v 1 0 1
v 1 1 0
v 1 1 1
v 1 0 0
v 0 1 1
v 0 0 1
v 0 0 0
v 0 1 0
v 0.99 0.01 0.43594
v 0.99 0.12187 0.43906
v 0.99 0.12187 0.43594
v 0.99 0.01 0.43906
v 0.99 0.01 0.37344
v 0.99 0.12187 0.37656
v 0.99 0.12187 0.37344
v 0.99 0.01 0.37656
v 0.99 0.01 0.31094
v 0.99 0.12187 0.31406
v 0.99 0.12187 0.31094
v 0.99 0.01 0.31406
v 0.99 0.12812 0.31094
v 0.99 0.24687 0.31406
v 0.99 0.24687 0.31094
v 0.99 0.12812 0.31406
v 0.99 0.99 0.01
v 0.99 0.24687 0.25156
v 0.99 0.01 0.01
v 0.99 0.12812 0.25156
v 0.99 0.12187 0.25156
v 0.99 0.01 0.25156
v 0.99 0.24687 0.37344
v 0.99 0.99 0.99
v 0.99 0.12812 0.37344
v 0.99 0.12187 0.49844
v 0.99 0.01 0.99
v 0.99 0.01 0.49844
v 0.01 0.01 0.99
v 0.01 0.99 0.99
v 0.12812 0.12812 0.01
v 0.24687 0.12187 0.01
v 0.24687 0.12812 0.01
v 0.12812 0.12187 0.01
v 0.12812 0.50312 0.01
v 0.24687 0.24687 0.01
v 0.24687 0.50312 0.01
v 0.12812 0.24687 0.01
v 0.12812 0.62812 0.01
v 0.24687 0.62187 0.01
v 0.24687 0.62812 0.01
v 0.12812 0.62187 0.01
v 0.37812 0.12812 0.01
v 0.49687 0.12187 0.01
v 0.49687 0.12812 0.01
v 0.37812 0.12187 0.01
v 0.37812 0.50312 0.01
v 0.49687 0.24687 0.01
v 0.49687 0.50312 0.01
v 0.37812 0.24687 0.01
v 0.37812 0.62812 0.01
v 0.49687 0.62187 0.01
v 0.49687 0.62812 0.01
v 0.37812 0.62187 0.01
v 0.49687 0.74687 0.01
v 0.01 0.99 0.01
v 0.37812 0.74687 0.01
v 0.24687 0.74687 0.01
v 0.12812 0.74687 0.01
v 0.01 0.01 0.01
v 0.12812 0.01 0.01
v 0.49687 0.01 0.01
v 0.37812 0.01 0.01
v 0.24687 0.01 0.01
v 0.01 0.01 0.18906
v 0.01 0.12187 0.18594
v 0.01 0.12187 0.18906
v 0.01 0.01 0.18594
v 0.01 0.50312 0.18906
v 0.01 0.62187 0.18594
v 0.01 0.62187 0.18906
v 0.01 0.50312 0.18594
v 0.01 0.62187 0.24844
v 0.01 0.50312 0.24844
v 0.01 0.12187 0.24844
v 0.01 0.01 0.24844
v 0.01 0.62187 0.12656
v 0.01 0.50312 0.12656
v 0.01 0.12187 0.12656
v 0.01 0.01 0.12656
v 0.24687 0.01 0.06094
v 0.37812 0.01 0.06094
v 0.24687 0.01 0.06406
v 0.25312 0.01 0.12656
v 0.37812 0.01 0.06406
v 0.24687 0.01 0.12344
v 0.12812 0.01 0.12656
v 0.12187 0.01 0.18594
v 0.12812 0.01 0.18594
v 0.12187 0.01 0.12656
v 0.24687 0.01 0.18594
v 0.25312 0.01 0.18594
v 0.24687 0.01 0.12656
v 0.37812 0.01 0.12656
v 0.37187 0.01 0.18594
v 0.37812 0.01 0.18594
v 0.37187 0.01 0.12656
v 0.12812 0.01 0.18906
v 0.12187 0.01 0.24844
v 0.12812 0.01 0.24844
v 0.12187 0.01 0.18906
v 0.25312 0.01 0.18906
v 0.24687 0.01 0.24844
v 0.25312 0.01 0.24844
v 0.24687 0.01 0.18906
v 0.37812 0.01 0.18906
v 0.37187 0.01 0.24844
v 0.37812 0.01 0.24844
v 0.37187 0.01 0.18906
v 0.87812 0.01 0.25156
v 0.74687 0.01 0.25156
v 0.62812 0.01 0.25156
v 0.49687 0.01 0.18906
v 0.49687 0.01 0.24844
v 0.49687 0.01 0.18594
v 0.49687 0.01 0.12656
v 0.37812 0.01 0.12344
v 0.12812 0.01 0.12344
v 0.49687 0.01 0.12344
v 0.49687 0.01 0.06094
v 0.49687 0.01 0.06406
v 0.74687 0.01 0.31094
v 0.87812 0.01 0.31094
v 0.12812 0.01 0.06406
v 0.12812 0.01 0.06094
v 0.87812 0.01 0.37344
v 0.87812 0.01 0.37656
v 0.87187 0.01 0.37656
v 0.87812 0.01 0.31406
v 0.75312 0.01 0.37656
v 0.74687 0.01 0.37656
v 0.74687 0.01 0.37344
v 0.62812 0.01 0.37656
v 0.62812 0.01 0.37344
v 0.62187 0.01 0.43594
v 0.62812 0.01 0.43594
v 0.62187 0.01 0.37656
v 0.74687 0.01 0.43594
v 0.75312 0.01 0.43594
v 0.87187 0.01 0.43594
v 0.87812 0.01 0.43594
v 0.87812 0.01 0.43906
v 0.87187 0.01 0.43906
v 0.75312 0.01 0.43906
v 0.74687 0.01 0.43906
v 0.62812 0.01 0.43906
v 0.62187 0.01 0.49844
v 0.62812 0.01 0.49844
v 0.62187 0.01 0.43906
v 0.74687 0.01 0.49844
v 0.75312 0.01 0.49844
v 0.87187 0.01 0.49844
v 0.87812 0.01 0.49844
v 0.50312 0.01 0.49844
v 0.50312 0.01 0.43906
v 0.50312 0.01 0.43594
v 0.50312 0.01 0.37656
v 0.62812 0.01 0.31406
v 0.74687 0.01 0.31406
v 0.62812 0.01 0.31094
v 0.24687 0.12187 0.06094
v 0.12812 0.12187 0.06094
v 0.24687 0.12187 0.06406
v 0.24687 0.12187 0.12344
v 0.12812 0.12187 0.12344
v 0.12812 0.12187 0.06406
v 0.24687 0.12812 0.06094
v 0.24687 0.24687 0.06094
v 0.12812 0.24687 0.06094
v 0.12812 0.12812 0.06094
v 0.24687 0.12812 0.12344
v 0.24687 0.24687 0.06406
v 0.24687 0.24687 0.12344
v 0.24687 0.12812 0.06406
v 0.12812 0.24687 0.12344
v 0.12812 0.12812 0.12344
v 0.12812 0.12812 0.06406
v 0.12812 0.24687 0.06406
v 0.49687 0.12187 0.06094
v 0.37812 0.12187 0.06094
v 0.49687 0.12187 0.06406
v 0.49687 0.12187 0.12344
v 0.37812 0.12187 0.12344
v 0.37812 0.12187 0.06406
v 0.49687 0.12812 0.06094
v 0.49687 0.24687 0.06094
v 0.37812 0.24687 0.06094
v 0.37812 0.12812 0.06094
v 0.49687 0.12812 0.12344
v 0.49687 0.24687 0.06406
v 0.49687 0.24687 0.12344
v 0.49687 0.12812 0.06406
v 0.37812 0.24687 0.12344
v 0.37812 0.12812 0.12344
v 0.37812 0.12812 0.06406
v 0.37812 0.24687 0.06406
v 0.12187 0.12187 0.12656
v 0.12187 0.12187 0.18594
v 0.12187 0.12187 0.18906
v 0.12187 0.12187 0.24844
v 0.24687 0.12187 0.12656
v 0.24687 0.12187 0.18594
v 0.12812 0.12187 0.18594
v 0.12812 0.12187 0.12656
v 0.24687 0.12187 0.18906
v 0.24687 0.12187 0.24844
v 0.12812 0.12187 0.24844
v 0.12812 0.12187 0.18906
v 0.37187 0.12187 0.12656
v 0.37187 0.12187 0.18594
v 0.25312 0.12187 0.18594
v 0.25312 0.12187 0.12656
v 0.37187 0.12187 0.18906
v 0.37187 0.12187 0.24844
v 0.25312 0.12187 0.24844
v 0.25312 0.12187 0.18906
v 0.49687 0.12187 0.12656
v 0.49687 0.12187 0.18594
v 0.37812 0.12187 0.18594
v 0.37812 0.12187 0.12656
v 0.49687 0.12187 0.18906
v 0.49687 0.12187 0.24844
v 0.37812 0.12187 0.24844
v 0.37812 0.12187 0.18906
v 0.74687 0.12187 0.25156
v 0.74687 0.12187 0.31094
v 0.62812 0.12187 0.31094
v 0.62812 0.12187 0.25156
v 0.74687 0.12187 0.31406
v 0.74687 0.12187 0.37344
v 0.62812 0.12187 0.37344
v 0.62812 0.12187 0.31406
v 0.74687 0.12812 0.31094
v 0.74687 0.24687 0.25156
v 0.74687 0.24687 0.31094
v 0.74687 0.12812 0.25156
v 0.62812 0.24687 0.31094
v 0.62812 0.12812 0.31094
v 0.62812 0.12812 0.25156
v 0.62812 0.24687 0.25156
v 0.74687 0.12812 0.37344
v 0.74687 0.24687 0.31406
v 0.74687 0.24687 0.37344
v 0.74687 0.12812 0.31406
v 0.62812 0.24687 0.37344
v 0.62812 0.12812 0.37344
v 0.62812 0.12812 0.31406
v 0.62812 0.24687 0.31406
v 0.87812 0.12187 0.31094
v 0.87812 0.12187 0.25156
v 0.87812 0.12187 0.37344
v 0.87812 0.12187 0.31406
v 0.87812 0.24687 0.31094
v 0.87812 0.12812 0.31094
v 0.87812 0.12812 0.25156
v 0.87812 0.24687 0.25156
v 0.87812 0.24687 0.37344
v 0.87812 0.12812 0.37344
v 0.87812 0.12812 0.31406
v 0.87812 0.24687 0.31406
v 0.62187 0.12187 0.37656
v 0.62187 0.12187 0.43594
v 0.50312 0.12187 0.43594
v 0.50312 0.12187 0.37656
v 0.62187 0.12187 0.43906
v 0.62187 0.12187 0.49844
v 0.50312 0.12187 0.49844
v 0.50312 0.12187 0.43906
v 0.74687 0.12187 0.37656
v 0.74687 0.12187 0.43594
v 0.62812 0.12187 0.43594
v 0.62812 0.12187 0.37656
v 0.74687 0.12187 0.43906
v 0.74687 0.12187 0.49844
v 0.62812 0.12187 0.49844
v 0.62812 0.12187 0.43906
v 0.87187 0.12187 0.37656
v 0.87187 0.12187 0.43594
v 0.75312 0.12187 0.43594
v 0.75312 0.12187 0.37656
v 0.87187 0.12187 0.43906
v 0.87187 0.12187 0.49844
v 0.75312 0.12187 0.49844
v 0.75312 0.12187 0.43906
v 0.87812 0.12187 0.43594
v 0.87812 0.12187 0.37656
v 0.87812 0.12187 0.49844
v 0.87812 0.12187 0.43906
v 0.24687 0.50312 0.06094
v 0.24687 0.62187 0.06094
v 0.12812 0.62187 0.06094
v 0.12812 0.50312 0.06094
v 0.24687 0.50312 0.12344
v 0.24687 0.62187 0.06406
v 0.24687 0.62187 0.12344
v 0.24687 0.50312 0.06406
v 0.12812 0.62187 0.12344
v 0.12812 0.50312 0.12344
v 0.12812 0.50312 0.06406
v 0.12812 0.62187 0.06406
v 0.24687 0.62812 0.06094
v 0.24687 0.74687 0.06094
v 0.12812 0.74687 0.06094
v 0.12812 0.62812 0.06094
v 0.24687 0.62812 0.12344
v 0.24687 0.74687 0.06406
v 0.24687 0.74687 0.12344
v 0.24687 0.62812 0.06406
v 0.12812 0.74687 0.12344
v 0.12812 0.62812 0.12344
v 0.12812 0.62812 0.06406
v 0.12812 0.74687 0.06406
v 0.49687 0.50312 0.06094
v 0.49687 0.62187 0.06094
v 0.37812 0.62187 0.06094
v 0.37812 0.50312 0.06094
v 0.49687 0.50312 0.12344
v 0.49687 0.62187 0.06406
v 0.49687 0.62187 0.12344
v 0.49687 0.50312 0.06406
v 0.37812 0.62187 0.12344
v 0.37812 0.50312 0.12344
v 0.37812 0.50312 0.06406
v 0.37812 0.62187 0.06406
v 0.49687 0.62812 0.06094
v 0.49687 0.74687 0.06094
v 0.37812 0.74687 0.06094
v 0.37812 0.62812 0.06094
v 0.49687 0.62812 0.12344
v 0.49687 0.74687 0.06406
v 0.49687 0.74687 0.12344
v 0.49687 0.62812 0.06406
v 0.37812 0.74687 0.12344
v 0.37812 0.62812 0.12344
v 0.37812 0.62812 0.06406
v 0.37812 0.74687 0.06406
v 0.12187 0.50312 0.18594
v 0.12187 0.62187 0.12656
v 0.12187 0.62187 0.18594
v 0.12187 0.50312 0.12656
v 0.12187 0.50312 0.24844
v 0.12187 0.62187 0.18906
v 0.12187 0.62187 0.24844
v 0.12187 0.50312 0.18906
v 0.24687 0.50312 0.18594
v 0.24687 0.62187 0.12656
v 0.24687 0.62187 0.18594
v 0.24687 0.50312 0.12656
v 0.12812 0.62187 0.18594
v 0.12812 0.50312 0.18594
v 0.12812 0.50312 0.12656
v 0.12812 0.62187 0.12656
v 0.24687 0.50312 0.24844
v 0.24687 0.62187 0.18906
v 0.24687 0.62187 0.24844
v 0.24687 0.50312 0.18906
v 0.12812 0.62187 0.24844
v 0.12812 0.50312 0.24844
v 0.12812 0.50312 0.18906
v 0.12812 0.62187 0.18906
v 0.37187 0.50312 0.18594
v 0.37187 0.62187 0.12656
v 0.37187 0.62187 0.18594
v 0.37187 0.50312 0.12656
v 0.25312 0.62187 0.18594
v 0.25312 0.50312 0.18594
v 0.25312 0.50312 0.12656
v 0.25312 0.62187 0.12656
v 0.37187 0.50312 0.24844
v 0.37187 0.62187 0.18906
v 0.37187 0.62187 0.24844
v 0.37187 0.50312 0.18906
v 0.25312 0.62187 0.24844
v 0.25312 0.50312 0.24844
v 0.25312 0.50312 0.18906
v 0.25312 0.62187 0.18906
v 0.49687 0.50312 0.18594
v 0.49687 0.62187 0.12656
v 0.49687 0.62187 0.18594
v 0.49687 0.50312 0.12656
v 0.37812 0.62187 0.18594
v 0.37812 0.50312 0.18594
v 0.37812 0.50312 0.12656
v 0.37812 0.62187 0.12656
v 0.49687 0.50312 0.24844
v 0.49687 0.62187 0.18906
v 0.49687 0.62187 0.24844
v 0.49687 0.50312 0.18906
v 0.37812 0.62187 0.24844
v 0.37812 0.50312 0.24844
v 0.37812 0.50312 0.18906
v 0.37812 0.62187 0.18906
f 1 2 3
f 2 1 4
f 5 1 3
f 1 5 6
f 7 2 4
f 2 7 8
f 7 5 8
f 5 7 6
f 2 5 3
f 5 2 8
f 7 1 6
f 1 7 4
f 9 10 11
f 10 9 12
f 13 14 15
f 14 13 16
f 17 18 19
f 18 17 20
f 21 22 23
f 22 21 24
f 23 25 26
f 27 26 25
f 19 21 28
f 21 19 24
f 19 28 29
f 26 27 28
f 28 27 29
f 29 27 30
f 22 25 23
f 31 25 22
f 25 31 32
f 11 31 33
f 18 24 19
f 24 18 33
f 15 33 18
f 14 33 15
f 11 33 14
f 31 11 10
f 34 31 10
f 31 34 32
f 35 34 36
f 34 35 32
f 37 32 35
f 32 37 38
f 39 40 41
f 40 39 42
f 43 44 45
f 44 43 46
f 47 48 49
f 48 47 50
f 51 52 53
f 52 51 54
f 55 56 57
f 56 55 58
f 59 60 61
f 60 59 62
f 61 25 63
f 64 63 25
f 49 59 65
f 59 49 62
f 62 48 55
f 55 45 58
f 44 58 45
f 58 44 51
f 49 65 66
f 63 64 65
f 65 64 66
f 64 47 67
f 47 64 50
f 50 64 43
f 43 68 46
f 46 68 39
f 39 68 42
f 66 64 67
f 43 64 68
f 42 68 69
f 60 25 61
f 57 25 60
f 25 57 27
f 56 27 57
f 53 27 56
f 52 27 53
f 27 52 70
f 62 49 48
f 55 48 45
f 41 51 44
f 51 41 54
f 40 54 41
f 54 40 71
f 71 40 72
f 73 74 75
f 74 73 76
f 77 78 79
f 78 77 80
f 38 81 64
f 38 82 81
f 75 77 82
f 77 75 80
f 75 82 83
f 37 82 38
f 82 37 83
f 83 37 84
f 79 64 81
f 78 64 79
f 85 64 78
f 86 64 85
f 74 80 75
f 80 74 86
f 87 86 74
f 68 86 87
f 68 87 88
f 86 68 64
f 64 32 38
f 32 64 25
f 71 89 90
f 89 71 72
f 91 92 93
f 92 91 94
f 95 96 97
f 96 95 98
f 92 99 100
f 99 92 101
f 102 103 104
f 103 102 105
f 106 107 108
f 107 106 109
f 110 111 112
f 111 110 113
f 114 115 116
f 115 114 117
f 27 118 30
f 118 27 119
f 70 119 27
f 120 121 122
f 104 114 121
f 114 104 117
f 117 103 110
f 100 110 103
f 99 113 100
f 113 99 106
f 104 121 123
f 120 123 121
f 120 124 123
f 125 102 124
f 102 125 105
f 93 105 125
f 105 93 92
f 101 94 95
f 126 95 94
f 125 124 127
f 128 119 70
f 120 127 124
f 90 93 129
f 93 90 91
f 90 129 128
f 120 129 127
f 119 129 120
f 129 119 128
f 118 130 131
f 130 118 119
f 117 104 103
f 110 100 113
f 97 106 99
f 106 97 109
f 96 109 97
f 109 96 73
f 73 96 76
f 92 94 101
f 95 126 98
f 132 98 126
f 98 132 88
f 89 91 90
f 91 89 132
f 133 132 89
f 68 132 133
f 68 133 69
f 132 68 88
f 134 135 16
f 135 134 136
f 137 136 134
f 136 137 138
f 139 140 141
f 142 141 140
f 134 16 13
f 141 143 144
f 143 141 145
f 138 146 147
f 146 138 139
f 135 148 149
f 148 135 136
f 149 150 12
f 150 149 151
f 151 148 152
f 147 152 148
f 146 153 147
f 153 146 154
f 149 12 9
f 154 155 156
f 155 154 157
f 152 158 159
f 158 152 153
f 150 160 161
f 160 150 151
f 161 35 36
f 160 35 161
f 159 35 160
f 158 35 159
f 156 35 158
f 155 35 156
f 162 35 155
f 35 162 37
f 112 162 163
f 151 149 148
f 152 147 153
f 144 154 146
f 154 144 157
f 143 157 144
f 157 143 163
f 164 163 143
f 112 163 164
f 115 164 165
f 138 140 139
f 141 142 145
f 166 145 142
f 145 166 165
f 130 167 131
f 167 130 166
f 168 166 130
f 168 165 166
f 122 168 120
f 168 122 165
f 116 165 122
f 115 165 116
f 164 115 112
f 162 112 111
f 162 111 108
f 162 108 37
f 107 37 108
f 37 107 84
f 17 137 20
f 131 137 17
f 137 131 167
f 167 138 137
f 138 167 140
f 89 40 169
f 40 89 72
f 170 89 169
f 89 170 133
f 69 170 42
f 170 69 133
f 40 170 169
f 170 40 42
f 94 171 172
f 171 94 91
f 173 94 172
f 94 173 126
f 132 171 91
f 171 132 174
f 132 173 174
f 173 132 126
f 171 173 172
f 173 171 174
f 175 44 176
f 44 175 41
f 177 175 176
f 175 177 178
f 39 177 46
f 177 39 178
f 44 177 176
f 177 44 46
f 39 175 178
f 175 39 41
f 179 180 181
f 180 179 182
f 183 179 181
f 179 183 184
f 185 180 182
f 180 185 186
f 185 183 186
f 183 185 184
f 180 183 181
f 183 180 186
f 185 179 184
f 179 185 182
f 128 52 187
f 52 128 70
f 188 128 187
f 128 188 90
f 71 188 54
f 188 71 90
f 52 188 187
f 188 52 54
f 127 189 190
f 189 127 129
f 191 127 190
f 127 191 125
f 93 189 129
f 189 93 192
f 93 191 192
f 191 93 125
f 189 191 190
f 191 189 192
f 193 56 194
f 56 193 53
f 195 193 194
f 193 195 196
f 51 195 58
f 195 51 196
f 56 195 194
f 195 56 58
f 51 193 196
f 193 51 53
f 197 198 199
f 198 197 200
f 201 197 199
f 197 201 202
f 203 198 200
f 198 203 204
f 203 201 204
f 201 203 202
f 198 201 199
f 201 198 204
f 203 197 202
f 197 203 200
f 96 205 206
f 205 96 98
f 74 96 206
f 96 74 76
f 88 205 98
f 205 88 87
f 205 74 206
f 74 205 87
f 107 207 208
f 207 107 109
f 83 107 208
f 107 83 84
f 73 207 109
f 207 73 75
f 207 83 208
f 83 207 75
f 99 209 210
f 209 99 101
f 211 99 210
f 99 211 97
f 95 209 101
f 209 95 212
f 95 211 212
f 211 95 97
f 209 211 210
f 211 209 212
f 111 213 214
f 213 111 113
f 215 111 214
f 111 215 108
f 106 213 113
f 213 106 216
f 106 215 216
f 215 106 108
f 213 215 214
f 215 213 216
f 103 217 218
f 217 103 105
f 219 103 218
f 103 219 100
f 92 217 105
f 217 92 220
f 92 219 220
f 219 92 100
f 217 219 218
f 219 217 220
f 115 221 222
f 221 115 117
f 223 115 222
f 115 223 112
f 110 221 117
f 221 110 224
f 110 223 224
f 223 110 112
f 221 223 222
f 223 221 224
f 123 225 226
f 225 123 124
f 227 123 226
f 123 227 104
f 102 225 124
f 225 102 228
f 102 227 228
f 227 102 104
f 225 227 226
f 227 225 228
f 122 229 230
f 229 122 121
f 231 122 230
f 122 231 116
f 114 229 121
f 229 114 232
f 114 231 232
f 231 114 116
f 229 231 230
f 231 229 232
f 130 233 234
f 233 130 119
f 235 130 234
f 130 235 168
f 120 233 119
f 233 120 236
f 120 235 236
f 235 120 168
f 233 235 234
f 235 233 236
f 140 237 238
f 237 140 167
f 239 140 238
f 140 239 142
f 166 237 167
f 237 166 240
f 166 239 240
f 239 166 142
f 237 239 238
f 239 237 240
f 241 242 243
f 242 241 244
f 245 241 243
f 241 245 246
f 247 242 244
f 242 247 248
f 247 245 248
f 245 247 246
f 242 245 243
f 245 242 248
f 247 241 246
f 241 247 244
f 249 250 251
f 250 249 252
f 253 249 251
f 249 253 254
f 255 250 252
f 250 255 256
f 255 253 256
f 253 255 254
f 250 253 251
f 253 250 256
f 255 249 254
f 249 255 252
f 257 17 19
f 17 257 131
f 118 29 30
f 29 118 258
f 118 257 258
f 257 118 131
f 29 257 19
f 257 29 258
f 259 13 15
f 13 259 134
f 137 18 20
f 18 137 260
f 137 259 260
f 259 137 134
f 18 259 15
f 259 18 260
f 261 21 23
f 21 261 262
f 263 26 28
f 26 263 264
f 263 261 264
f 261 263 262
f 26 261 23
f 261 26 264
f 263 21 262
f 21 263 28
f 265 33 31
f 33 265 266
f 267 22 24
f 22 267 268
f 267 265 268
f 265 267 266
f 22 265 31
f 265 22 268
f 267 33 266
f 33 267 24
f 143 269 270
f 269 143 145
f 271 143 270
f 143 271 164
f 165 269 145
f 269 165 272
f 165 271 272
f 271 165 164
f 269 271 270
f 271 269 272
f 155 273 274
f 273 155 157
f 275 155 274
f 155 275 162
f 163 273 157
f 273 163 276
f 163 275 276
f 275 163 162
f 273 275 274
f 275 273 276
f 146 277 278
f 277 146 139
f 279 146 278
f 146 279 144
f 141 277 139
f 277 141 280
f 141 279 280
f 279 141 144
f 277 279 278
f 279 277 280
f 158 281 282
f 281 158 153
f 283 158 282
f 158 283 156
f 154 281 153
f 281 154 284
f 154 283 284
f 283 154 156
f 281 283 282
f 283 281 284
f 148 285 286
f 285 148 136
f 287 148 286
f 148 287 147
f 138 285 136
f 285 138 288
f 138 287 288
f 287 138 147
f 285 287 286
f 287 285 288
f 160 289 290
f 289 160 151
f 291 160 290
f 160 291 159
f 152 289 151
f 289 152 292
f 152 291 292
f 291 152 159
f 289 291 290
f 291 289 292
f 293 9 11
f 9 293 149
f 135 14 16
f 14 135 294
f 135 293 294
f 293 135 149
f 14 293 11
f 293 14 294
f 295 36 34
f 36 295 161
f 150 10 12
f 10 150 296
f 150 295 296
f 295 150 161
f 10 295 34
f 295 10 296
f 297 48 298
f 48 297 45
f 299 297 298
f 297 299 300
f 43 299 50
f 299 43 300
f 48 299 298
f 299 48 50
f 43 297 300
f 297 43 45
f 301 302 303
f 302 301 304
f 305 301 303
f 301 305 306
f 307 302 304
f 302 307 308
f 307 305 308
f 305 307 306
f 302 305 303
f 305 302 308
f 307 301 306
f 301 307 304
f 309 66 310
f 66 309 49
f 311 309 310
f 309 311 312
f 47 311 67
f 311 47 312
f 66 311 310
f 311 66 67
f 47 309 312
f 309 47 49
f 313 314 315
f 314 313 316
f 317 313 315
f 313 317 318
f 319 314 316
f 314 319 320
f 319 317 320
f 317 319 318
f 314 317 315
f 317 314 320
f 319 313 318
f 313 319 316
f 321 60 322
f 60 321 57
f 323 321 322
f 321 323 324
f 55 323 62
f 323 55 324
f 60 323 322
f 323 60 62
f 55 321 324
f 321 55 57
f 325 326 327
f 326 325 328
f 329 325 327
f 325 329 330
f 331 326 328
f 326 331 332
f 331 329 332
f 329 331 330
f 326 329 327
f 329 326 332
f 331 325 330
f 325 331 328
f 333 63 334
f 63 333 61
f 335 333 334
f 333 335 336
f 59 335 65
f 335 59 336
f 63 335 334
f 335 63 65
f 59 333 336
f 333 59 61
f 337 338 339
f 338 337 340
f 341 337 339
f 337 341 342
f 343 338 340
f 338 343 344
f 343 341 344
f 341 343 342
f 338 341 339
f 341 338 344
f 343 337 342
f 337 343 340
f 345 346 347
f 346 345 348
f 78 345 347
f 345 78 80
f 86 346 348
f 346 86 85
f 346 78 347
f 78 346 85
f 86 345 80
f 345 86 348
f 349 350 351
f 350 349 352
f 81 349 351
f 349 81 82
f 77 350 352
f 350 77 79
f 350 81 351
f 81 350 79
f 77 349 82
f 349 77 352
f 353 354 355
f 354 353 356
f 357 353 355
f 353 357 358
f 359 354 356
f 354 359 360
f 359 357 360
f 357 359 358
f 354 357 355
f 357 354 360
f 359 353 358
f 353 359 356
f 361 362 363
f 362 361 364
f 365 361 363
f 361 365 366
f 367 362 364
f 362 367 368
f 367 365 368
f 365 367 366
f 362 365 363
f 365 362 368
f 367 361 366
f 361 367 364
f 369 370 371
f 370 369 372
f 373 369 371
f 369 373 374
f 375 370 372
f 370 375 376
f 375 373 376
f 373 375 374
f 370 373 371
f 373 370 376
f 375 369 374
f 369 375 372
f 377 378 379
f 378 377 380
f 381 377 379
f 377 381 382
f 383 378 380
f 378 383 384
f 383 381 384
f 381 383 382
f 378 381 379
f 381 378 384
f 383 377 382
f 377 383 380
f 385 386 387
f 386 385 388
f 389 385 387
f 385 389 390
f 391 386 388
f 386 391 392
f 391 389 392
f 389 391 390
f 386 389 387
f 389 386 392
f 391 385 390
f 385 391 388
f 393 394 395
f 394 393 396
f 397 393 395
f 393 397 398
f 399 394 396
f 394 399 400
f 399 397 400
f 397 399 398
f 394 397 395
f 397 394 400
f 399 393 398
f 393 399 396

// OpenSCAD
translate([0.1875, 0.0625, 0.03125]) color([0.49526784137177327, 0.4372003251594626, 0.555801050790344]) cube([0.11875, 0.11875, 0.059375], center=true);
translate([0.1875, 0.0625, 0.09375]) color([0.31857004462487193, 0.9078063470547019, 0.7302618013814679]) cube([0.11875, 0.11875, 0.059375], center=true);
translate([0.1875, 0.1875, 0.03125]) color([0.95014748779075, 0.3628591026747887, 0.42604415935984796]) cube([0.11875, 0.11875, 0.059375], center=true);
translate([0.1875, 0.1875, 0.09375]) color([0.6981812408346078, 0.17304337119877766, 0.20255072561106702]) cube([0.11875, 0.11875, 0.059375], center=true);
translate([0.4375, 0.0625, 0.03125]) color([0.29222321886950675, 0.15919522871894443, 0.3934579183375073]) cube([0.11875, 0.11875, 0.059375], center=true);
translate([0.4375, 0.0625, 0.09375]) color([0.2592885424880965, 0.02773012653285345, 0.05515463276090393]) cube([0.11875, 0.11875, 0.059375], center=true);
translate([0.4375, 0.1875, 0.03125]) color([0.12685155616775967, 0.9768194108135579, 0.5776699711738245]) cube([0.11875, 0.11875, 0.059375], center=true);
translate([0.4375, 0.1875, 0.09375]) color([0.371609312921629, 0.6066690103576221, 0.9359731738923596]) cube([0.11875, 0.11875, 0.059375], center=true);
translate([0.0625, 0.0625, 0.15625]) color([0.43915814289282884, 0.8832790973523417, 0.6981686654237368]) cube([0.11875, 0.11875, 0.059375], center=true);
translate([0.0625, 0.0625, 0.21875]) color([0.6080049041009332, 0.8848103686294639, 0.22873763955348214]) cube([0.11875, 0.11875, 0.059375], center=true);
translate([0.1875, 0.0625, 0.15625]) color([0.033062780500188294, 0.8871307728271401, 0.29210896005887643]) cube([0.11875, 0.11875, 0.059375], center=true);
translate([0.1875, 0.0625, 0.21875]) color([0.7330612035666123, 0.15826216279791738, 0.01052043144160919]) cube([0.11875, 0.11875, 0.059375], center=true);
translate([0.3125, 0.0625, 0.15625]) color([0.6684379330538738, 0.49837541412572695, 0.27819022826730455]) cube([0.11875, 0.11875, 0.059375], center=true);
translate([0.3125, 0.0625, 0.21875]) color([0.018234503354579212, 0.09731779548106412, 0.5750337829983204]) cube([0.11875, 0.11875, 0.059375], center=true);
translate([0.4375, 0.0625, 0.15625]) color([0.7847929148803694, 0.9266461351094233, 0.01222580910333737]) cube([0.11875, 0.11875, 0.059375], center=true);
translate([0.4375, 0.0625, 0.21875]) color([0.0936264187134781, 0.7934174911356588, 0.62219663893542]) cube([0.11875, 0.11875, 0.059375], center=true);
translate([0.6875, 0.0625, 0.28125]) color([0.3304494433697437, 0.7946314434029055, 0.4085299890627685]) cube([0.11875, 0.11875, 0.059375], center=true);
translate([0.6875, 0.0625, 0.34375]) color([0.8474130259428642, 0.22184521622524522, 0.9135479660236738]) cube([0.11875, 0.11875, 0.059375], center=true);
translate([0.6875, 0.1875, 0.28125]) color([0.4396666303332736, 0.8221012938126732, 0.6437358381189949]) cube([0.11875, 0.11875, 0.059375], center=true);
translate([0.6875, 0.1875, 0.34375]) color([0.4076593755930139, 0.5502364988043441, 0.06879949665476082]) cube([0.11875, 0.11875, 0.059375], center=true);
translate([0.9375, 0.0625, 0.28125]) color([0.5238225731999778, 0.41019606326911906, 0.8842137422688724]) cube([0.11875, 0.11875, 0.059375], center=true);
translate([0.9375, 0.0625, 0.34375]) color([0.2135030735801825, 0.6668828779875619, 0.5824647024768087]) cube([0.11875, 0.11875, 0.059375], center=true);
translate([0.9375, 0.1875, 0.28125]) color([0.39153394257438856, 0.7171738411302545, 0.5179657992525565]) cube([0.11875, 0.11875, 0.059375], center=true);
translate([0.9375, 0.1875, 0.34375]) color([0.3003567623234663, 0.3834266815555859, 0.8392873903831596]) cube([0.11875, 0.11875, 0.059375], center=true);
translate([0.5625, 0.0625, 0.40625]) color([0.932359571454312, 0.4938821012827268, 0.10849858137029877]) cube([0.11875, 0.11875, 0.059375], center=true);
translate([0.5625, 0.0625, 0.46875]) color([0.5615415183594084, 0.5489011679558757, 0.19770728393815207]) cube([0.11875, 0.11875, 0.059375], center=true);
translate([0.6875, 0.0625, 0.40625]) color([0.6368036454816876, 0.4396073138404065, 0.21313533217243863]) cube([0.11875, 0.11875, 0.059375], center=true);
translate([0.6875, 0.0625, 0.46875]) color([0.65487357625566, 0.5195911243495295, 0.9295357628477254]) cube([0.11875, 0.11875, 0.059375], center=true);
translate([0.8125, 0.0625, 0.40625]) color([0.5484054396345015, 0.1795491616181364, 0.36277019899079666]) cube([0.11875, 0.11875, 0.059375], center=true);
translate([0.8125, 0.0625, 0.46875]) color([0.18327488955431748, 0.8508590189062505, 0.29785415045258956]) cube([0.11875, 0.11875, 0.059375], center=true);
translate([0.9375, 0.0625, 0.40625]) color([0.411094591289488, 0.47496521267566827, 0.8230140415091162]) cube([0.11875, 0.11875, 0.059375], center=true);
translate([0.9375, 0.0625, 0.46875]) color([0.021499284860199475, 0.7360068744554104, 0.893171130180962]) cube([0.11875, 0.11875, 0.059375], center=true);
translate([0.1875, 0.5625, 0.03125]) color([0.44662950243921207, 0.6272112083314144, 0.04251959027778274]) cube([0.11875, 0.11875, 0.059375], center=true);
translate([0.1875, 0.5625, 0.09375]) color([0.4476031180289046, 0.16092623262395112, 0.5490446113012659]) cube([0.11875, 0.11875, 0.059375], center=true);
translate([0.1875, 0.6875, 0.03125]) color([0.5238541341212296, 0.43791302636404483, 0.31093574855308515]) cube([0.11875, 0.11875, 0.059375], center=true);
translate([0.1875, 0.6875, 0.09375]) color([0.021000853231791017, 0.9173252836960585, 0.17273941339049093]) cube([0.11875, 0.11875, 0.059375], center=true);
translate([0.4375, 0.5625, 0.03125]) color([0.8119685420560828, 0.5544206155784966, 0.7059921475581654]) cube([0.11875, 0.11875, 0.059375], center=true);
translate([0.4375, 0.5625, 0.09375]) color([0.6515959308990943, 0.1711768401247621, 0.5427157127593492]) cube([0.11875, 0.11875, 0.059375], center=true);
translate([0.4375, 0.6875, 0.03125]) color([0.8963847945892117, 0.17768527860810712, 0.7421299433927584]) cube([0.11875, 0.11875, 0.059375], center=true);
translate([0.4375, 0.6875, 0.09375]) color([0.5726441032141332, 0.7010906565364345, 2.8054897536655687e-05]) cube([0.11875, 0.11875, 0.059375], center=true);
translate([0.0625, 0.5625, 0.15625]) color([0.9927151128849199, 0.5738875881200397, 0.8693414592253195]) cube([0.11875, 0.11875, 0.059375], center=true);
translate([0.0625, 0.5625, 0.21875]) color([0.1879433986893274, 0.8080743352120339, 0.7348689117343706]) cube([0.11875, 0.11875, 0.059375], center=true);
translate([0.1875, 0.5625, 0.15625]) color([0.7771443311946873, 0.8187058499328415, 0.8365967518242569]) cube([0.11875, 0.11875, 0.059375], center=true);
translate([0.1875, 0.5625, 0.21875]) color([0.06142612673944736, 0.012155815124797242, 0.17105860394151118]) cube([0.11875, 0.11875, 0.059375], center=true);
translate([0.3125, 0.5625, 0.15625]) color([0.40881469891267075, 0.7784186392027261, 0.48412143043336353]) cube([0.11875, 0.11875, 0.059375], center=true);
translate([0.3125, 0.5625, 0.21875]) color([0.5999385703938157, 0.3872103803868594, 0.8857238548019783]) cube([0.11875, 0.11875, 0.059375], center=true);
translate([0.4375, 0.5625, 0.15625]) color([0.21338376623042987, 0.43169898258233064, 0.43099073564172463]) cube([0.11875, 0.11875, 0.059375], center=true);
translate([0.4375, 0.5625, 0.21875]) color([0.6890465906315197, 0.1719415155377383, 0.5952666159975146]) cube([0.11875, 0.11875, 0.059375], center=true);
color([0.3,0.3,0.3,0.3]) difference() { cube([1,1,1]); translate([0.01,0.01,0.01]) cube([0.98,0.98,0.98]); }
